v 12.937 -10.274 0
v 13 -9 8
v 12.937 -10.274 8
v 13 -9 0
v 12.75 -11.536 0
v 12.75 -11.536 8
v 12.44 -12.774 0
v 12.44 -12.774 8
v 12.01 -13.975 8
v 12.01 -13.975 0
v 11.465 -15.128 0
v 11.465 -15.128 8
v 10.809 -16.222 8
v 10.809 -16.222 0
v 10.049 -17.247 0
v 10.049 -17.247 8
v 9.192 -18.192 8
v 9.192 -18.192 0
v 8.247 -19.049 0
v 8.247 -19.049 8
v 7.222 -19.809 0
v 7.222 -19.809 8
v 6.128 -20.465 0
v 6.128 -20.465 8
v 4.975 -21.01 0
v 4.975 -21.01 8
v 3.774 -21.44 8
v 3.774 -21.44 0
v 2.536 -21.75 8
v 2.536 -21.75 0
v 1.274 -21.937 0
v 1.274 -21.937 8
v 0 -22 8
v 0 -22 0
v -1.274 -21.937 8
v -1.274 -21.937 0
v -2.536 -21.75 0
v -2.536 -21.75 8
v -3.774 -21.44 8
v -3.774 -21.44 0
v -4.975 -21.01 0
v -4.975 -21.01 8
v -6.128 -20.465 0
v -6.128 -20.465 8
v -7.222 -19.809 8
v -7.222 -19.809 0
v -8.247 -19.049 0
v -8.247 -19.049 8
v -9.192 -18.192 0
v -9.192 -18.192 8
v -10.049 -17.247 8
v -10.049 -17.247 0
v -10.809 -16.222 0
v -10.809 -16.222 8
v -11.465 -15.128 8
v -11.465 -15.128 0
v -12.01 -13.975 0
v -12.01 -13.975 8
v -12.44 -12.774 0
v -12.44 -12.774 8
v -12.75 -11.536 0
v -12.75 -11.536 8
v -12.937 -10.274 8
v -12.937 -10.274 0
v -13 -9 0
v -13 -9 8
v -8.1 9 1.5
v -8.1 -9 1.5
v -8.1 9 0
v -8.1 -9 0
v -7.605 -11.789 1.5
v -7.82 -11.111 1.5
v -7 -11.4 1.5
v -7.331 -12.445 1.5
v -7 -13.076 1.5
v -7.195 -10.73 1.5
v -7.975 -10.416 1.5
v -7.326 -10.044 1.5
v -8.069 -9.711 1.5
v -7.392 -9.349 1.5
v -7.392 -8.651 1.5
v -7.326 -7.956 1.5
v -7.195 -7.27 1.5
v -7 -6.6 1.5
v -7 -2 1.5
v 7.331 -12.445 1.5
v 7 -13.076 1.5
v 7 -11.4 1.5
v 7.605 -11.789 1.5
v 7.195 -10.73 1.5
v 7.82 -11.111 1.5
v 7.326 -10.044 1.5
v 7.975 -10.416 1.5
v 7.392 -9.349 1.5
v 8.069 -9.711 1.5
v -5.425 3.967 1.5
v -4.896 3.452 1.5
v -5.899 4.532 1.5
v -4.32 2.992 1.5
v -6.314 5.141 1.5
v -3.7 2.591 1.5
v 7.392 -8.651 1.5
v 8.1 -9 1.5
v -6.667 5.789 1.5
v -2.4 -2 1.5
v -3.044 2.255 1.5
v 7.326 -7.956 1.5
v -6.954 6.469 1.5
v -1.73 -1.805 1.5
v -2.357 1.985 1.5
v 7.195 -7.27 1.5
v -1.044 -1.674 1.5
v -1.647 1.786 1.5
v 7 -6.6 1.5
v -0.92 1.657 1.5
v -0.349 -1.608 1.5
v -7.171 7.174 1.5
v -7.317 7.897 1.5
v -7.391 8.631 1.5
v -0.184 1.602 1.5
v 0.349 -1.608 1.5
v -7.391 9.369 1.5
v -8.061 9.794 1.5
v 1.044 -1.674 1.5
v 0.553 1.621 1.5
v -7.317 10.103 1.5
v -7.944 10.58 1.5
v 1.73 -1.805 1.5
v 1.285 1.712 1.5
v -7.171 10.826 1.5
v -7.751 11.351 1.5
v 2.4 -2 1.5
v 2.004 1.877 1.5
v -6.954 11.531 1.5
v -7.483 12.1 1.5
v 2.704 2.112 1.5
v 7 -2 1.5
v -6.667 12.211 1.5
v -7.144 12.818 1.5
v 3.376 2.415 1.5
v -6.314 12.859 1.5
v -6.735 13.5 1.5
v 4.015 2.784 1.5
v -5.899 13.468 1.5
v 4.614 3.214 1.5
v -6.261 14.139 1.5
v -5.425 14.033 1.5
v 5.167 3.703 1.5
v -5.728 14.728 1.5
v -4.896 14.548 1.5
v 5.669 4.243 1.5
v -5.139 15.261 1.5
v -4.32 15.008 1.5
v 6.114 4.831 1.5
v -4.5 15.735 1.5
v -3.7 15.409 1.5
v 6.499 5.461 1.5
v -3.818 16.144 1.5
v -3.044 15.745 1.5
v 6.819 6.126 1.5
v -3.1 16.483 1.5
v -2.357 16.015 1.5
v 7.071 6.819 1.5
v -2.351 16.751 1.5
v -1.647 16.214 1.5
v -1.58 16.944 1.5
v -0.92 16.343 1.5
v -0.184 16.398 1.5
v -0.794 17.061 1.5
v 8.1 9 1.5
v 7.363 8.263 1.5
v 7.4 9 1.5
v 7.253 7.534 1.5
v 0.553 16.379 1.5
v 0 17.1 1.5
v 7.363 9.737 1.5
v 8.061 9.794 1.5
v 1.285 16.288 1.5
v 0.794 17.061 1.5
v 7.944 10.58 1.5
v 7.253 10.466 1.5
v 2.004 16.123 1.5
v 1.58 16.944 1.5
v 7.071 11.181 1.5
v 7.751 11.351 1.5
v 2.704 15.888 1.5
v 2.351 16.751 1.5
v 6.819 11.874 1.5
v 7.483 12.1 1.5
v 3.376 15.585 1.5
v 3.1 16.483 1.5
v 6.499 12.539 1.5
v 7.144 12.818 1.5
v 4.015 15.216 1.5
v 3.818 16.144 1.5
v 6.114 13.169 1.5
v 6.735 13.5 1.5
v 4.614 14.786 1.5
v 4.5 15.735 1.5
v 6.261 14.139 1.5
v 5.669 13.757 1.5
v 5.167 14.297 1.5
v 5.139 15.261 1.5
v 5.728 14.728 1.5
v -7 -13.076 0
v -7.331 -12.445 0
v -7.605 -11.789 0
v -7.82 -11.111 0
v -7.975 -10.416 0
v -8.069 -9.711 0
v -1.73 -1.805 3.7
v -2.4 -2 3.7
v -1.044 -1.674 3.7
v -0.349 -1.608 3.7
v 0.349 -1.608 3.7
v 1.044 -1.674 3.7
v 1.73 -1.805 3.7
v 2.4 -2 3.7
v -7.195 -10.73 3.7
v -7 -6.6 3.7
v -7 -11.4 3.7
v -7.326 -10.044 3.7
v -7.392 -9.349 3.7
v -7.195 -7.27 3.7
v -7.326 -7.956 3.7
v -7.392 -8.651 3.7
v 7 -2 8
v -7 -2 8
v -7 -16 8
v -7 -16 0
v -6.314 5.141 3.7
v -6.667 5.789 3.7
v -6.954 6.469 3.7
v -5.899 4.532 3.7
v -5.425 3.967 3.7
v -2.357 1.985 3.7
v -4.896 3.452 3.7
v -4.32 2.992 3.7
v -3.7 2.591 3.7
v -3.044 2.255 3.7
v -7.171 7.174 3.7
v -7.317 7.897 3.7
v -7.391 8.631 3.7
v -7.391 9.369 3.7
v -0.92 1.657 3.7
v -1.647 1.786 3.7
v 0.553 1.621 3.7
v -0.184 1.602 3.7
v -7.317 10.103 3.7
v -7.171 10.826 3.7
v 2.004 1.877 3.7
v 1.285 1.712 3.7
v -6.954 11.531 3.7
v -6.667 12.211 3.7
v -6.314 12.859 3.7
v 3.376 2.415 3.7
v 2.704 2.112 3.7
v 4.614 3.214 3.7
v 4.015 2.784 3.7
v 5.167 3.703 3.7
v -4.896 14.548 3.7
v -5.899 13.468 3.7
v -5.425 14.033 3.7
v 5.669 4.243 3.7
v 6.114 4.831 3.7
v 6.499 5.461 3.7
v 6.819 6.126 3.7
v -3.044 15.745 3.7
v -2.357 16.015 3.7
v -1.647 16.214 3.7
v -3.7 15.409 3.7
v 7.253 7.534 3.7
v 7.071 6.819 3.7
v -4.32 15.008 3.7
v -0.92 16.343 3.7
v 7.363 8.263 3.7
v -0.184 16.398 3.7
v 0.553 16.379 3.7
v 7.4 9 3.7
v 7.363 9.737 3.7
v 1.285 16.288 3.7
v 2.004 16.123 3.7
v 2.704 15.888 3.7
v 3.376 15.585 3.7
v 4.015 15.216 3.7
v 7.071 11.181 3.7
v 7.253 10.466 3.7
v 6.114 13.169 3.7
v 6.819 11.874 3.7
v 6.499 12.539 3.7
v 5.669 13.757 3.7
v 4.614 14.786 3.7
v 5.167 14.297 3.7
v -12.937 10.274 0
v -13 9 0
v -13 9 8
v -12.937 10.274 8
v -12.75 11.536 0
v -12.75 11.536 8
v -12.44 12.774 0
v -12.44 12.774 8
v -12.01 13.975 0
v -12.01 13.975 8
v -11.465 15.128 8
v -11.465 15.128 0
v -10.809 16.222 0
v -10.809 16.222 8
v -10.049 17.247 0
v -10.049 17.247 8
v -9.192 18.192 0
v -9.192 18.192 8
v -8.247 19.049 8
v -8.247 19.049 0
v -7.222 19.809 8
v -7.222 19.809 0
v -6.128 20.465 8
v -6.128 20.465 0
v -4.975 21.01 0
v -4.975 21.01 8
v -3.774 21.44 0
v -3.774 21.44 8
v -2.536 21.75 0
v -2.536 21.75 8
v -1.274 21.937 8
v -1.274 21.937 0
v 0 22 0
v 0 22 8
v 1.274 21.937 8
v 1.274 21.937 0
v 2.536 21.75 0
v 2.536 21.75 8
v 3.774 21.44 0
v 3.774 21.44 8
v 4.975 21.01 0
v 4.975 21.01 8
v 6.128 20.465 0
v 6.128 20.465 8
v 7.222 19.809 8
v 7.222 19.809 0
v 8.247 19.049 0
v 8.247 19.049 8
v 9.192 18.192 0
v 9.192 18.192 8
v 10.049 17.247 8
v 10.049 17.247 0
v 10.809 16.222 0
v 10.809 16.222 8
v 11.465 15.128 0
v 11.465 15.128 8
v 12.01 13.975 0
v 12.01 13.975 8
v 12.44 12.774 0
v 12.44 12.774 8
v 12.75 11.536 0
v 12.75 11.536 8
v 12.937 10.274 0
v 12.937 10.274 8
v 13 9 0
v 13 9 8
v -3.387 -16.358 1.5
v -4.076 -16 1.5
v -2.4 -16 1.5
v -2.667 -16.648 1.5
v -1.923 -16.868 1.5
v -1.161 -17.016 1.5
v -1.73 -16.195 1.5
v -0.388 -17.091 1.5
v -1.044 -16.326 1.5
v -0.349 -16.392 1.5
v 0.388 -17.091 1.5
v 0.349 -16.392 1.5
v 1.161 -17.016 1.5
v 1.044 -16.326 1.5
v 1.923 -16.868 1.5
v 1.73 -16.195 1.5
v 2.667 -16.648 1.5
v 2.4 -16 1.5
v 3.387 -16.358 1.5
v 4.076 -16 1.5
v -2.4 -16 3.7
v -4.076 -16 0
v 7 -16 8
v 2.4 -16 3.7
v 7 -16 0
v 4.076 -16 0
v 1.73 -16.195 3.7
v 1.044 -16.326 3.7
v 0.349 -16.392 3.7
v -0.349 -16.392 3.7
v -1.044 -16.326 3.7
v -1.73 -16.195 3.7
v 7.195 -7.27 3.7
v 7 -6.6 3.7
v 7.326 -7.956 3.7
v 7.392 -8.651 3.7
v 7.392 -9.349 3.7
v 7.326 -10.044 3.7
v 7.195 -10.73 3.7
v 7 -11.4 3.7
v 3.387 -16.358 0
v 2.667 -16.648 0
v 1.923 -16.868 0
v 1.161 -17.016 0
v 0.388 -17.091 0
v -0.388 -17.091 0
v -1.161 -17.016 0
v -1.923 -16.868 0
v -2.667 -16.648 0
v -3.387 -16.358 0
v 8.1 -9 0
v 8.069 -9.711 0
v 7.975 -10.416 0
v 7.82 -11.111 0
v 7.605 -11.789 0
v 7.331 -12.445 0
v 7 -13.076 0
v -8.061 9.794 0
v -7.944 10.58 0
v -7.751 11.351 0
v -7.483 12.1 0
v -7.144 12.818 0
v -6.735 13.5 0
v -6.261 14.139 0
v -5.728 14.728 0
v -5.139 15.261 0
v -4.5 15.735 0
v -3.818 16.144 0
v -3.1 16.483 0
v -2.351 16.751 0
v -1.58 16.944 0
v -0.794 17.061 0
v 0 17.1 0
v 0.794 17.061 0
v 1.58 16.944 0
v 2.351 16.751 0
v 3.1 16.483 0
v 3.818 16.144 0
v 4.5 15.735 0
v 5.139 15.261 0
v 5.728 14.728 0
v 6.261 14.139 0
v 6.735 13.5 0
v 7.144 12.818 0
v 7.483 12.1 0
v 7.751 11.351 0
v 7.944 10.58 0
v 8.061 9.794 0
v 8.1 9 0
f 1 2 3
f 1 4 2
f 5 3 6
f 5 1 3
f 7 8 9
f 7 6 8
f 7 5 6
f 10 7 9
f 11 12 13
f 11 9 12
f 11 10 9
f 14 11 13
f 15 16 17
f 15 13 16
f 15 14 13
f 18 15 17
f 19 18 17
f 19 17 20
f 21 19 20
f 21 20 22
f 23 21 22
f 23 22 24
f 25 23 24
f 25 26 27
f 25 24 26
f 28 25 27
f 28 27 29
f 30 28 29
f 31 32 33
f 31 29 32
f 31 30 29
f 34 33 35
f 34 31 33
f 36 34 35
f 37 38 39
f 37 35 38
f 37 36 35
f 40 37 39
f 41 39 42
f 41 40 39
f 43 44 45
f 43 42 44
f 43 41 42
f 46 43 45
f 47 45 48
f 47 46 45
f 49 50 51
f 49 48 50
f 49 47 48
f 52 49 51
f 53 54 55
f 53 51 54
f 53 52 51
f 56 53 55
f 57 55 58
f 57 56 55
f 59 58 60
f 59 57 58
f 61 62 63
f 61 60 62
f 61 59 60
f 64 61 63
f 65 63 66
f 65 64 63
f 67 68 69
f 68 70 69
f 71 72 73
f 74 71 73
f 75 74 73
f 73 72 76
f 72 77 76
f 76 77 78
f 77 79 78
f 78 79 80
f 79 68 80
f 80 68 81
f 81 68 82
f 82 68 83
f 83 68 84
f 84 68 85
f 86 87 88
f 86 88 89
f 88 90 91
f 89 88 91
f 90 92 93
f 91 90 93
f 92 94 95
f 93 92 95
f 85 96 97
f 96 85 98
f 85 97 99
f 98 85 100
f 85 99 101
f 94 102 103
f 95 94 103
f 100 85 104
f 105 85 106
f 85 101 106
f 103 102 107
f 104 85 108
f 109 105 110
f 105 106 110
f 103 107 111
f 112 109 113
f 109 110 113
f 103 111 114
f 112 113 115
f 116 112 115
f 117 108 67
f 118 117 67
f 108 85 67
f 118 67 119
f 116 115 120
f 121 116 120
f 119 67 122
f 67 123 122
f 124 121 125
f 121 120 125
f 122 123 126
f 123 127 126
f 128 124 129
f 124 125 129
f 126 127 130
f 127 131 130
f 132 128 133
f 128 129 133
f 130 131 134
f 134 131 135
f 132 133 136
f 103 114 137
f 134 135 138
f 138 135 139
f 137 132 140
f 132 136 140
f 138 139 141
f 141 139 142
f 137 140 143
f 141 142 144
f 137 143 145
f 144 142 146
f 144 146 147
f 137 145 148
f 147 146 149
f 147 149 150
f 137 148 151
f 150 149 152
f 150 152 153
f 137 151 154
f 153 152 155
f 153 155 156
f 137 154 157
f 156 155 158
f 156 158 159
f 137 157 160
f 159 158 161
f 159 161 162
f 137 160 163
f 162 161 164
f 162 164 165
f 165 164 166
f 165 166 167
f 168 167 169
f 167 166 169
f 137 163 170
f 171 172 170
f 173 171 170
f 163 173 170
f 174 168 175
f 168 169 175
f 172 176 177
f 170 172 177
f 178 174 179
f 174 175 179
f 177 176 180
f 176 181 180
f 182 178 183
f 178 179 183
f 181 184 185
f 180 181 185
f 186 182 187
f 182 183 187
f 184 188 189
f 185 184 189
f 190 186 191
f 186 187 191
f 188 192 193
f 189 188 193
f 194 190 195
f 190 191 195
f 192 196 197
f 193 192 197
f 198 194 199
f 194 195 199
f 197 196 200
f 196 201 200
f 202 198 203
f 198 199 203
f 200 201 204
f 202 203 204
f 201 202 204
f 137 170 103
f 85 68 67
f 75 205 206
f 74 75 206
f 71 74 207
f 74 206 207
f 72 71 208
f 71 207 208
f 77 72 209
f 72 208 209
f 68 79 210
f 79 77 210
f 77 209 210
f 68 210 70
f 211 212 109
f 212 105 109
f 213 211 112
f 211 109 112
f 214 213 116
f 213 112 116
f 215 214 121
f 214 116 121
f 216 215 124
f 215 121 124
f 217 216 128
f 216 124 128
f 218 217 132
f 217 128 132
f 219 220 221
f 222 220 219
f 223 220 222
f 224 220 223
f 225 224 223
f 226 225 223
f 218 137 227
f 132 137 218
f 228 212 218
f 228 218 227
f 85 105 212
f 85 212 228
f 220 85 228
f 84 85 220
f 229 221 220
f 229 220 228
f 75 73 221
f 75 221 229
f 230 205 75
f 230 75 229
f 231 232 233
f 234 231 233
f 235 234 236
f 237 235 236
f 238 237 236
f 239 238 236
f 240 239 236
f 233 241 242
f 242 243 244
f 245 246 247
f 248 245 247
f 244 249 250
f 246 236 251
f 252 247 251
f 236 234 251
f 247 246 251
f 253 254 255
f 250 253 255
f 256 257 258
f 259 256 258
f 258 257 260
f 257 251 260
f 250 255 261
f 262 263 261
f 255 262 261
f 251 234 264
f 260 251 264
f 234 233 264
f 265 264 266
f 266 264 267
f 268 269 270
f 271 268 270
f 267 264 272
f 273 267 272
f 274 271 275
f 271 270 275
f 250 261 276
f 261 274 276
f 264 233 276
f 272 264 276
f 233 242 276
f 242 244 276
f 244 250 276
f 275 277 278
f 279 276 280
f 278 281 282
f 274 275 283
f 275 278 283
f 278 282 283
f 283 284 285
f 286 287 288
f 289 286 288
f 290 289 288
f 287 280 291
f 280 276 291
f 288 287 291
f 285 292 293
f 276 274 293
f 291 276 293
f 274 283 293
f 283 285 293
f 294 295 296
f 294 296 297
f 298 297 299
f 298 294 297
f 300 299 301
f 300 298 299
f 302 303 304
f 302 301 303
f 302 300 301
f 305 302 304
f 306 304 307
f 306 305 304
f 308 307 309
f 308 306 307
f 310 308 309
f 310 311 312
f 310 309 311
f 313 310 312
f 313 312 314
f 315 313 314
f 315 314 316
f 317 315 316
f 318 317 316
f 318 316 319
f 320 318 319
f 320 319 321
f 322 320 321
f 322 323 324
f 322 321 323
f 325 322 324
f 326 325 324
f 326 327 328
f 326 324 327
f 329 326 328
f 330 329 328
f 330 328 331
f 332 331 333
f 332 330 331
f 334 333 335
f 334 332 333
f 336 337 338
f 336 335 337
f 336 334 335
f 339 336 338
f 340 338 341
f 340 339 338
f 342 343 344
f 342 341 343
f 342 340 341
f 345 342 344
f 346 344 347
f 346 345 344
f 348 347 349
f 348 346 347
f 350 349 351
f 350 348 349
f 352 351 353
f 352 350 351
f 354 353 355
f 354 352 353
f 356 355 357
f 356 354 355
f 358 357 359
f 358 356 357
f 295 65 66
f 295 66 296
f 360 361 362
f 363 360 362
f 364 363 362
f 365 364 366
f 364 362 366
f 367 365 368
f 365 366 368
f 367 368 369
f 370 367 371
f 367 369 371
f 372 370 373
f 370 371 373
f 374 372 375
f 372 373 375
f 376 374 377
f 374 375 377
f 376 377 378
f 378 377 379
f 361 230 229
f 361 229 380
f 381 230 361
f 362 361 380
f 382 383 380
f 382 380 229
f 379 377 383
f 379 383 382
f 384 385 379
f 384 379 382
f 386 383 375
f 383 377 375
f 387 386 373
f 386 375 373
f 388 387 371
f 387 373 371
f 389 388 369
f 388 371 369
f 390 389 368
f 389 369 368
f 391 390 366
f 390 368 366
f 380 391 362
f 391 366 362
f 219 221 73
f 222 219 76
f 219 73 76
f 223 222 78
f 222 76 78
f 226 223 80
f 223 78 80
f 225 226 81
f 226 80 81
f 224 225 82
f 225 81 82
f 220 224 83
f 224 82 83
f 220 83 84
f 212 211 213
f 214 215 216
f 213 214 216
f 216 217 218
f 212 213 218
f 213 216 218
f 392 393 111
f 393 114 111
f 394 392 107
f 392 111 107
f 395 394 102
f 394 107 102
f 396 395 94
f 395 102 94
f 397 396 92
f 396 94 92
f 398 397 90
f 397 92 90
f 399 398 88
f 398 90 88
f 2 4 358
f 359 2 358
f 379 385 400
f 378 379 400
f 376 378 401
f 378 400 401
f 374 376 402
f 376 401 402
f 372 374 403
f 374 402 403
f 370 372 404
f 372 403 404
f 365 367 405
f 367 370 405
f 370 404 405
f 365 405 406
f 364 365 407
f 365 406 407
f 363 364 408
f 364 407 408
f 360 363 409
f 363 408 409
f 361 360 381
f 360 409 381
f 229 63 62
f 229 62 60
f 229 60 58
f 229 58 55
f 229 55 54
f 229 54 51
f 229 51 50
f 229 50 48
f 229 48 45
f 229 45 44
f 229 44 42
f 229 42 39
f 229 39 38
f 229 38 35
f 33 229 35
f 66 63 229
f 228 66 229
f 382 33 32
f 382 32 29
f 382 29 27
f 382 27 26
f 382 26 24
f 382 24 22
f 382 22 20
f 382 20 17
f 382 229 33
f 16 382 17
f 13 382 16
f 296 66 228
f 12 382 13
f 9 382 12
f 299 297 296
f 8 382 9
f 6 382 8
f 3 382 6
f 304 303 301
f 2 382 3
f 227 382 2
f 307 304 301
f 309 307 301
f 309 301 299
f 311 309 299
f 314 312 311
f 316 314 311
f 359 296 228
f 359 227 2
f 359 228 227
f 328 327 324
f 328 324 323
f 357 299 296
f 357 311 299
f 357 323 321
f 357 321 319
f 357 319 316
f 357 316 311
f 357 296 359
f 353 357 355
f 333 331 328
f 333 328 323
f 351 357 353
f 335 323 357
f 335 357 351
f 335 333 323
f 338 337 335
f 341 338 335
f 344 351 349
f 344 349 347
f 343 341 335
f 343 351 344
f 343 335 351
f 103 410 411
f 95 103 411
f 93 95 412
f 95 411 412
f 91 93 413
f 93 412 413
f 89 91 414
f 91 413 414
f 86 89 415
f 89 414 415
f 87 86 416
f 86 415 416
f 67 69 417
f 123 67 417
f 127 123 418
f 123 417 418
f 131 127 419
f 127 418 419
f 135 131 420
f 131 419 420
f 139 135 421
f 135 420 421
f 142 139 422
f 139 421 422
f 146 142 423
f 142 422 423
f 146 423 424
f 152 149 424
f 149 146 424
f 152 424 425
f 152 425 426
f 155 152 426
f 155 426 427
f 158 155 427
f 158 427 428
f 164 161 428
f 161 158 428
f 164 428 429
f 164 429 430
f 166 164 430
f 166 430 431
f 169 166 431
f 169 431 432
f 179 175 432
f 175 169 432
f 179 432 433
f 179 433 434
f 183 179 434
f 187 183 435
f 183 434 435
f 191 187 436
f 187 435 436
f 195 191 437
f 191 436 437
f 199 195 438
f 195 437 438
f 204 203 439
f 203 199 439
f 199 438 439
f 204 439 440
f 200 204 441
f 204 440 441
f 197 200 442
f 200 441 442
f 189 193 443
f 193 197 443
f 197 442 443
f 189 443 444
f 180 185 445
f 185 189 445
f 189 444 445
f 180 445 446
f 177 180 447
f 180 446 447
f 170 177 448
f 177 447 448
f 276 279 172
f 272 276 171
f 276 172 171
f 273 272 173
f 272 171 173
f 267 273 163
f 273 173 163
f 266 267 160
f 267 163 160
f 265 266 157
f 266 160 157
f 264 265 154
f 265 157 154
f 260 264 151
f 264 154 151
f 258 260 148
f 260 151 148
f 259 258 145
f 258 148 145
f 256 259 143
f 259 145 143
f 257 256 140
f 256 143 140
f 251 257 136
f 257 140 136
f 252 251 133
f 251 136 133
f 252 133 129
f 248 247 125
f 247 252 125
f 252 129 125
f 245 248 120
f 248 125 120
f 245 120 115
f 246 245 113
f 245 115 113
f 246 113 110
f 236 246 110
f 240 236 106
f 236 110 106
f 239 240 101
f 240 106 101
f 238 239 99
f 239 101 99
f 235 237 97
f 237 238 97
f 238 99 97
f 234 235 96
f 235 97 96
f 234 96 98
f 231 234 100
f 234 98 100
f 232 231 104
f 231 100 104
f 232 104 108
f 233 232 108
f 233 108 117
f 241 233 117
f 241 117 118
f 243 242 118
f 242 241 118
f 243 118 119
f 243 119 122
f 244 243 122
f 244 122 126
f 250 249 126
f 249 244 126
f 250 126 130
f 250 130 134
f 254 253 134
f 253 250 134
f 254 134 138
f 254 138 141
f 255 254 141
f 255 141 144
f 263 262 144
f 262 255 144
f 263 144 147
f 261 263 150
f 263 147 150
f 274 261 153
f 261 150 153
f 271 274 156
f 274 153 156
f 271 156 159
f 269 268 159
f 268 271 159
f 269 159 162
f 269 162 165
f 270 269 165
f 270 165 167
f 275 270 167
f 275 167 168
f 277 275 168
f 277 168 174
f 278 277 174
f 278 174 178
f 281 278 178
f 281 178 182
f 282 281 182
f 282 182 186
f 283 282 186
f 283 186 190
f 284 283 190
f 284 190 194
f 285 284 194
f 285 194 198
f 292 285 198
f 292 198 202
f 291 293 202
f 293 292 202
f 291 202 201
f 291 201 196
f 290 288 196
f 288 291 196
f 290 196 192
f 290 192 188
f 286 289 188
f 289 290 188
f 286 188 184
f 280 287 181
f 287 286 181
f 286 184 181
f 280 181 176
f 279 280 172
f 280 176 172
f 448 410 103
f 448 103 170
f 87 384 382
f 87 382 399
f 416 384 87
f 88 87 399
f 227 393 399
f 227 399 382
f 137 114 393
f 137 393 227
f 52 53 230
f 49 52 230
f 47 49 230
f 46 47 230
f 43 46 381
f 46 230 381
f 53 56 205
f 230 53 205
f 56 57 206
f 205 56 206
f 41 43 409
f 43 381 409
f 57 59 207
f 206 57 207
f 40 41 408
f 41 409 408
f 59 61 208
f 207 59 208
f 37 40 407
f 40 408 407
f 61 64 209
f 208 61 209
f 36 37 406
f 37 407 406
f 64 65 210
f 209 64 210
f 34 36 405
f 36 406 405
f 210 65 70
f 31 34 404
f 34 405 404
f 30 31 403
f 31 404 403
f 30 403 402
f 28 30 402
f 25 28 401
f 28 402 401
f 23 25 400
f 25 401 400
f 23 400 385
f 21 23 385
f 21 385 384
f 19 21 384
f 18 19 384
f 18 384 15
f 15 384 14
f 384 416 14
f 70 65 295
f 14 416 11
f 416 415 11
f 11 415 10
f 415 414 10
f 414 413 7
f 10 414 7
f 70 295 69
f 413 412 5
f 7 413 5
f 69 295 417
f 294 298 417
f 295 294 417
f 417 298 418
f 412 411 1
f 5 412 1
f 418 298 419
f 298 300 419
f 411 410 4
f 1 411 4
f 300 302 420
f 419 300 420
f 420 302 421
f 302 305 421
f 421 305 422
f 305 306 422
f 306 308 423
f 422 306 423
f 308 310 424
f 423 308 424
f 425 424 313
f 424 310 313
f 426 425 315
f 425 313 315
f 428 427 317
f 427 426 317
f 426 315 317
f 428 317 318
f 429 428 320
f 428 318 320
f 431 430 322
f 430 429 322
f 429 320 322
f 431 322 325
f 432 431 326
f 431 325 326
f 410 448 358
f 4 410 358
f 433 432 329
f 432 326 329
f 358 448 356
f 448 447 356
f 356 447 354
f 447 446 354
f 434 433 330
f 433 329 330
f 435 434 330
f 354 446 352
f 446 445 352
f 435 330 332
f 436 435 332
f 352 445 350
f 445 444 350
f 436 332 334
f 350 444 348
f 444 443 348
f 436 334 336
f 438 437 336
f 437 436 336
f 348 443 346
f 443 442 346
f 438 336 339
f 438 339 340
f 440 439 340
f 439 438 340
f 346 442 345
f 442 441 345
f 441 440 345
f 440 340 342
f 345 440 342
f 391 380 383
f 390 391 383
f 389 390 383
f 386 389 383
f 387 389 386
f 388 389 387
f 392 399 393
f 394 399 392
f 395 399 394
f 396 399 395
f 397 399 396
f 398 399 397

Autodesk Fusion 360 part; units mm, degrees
sketch "Boceto1" plane through (0, 0, 0) normal (0, 0, 1) x (1, 0, 0)
  circle A0 centre (0, 9) radius 13
  circle A1 centre (0, -9) radius 13
  line L0 (-13, -9) -> (-13, 9)
  line L1 (13, -9) -> (13, 9)
extrude "Extruir1" add sketch "Boceto1" along normal blind 8 makes body 1
sketch "Boceto2" plane through (0, 0, 0) normal (0, 0, 1) x (1, 0, 0)
  circle A0 centre (0, 9) radius 8.6
  circle A1 centre (0, -9) radius 8.6
  line L0 (-8.6, -9) -> (-8.6, 9)
  line L1 (8.6, -9) -> (8.6, 9)
extrude "Extruir2" cut sketch "Boceto2" along normal blind 1.5 bodies 1
sketch "Boceto3" plane through (0, 0, 0) normal (0, 0, 1) x (1, 0, 0)
  circle A0 centre (0, 9) radius 8.2
  circle A1 centre (0, -9) radius 8.2
extrude "Extruir3" cut sketch "Boceto3" along normal blind 3.7 bodies 1
sketch "Boceto4" plane through (0, 0, 0) normal (0, 0, 1) x (1, 0, 0)
  line L0 (-6.5, -15.5) -> (6.5, -15.5)
  line L1 (6.5, -15.5) -> (6.5, -2.5)
  line L2 (6.5, -2.5) -> (-6.5, -2.5)
  line L3 (-6.5, -2.5) -> (-6.5, -15.5)
extrude "Extruir4" cut sketch "Boceto4" along normal blind 8 bodies 1
sketch "Boceto5" plane through (0, 0, 0) normal (0, 0, 1) x (1, 0, 0)
  circle A0 centre (0, 9) radius 13
  circle A1 centre (0, -9) radius 13
  line L0 (-13, -9) -> (-13, 9)
  line L1 (13, -9) -> (13, 9)
extrude "Extruir5" add sketch "Boceto5" along normal blind 8 separate body makes body 2
sketch "Boceto6" plane through (0, 0, 0) normal (0, 0, 1) x (1, 0, 0)
  circle A0 centre (0, 9) radius 8.2
  circle A1 centre (0, -9) radius 8.2
  line L0 (-8.2, -9) -> (-8.2, 9)
  line L1 (8.2, -9) -> (8.2, 9)
extrude "Extruir6" cut sketch "Boceto6" along normal blind 1.5 bodies 2
sketch "Boceto7" plane through (0, 0, 0) normal (0, 0, 1) x (1, 0, 0)
  circle A0 centre (0, 9) radius 7.5
  circle A1 centre (0, -9) radius 7.5
extrude "Extruir7" cut sketch "Boceto7" along normal blind 3.7 bodies 2
sketch "Boceto8" plane through (0, 0, 0) normal (0, 0, 1) x (1, 0, 0)
  line L0 (-7, -16) -> (7, -16)
  line L1 (7, -16) -> (7, -2)
  line L2 (7, -2) -> (-7, -2)
  line L3 (-7, -2) -> (-7, -16)
extrude "Extruir8" cut sketch "Boceto8" along normal blind 8 bodies 2
sketch "Boceto9" plane through (0, 0, 0) normal (0, 0, 1) x (1, 0, 0)
  circle A0 centre (0, 9) radius 13
  circle A1 centre (0, -9) radius 13
  line L0 (-13, -9) -> (-13, 9)
  line L1 (13, -9) -> (13, 9)
extrude "Extruir9" add sketch "Boceto9" along normal blind 8 separate body makes body 3
sketch "Boceto10" plane through (0, 0, 0) normal (0, 0, 1) x (1, 0, 0)
  circle A0 centre (0, 9) radius 8.1
  circle A1 centre (0, -9) radius 8.1
  line L0 (-8.1, -9) -> (-8.1, 9)
  line L1 (8.1, -9) -> (8.1, 9)
extrude "Extruir10" cut sketch "Boceto10" along normal blind 1.5 bodies 3
sketch "Boceto11" plane through (0, 0, 0) normal (0, 0, 1) x (1, 0, 0)
  circle A0 centre (0, 9) radius 7.4
  circle A1 centre (0, -9) radius 7.4
extrude "Extruir11" cut sketch "Boceto11" along normal blind 3.7 bodies 3
sketch "Boceto12" plane through (0, 0, 0) normal (0, 0, 1) x (1, 0, 0)
  line L0 (-7, -16) -> (7, -16)
  line L1 (7, -16) -> (7, -2)
  line L2 (7, -2) -> (-7, -2)
  line L3 (-7, -2) -> (-7, -16)
extrude "Extruir12" cut sketch "Boceto12" along normal blind 8 bodies 3
hidden bodies 1 2
